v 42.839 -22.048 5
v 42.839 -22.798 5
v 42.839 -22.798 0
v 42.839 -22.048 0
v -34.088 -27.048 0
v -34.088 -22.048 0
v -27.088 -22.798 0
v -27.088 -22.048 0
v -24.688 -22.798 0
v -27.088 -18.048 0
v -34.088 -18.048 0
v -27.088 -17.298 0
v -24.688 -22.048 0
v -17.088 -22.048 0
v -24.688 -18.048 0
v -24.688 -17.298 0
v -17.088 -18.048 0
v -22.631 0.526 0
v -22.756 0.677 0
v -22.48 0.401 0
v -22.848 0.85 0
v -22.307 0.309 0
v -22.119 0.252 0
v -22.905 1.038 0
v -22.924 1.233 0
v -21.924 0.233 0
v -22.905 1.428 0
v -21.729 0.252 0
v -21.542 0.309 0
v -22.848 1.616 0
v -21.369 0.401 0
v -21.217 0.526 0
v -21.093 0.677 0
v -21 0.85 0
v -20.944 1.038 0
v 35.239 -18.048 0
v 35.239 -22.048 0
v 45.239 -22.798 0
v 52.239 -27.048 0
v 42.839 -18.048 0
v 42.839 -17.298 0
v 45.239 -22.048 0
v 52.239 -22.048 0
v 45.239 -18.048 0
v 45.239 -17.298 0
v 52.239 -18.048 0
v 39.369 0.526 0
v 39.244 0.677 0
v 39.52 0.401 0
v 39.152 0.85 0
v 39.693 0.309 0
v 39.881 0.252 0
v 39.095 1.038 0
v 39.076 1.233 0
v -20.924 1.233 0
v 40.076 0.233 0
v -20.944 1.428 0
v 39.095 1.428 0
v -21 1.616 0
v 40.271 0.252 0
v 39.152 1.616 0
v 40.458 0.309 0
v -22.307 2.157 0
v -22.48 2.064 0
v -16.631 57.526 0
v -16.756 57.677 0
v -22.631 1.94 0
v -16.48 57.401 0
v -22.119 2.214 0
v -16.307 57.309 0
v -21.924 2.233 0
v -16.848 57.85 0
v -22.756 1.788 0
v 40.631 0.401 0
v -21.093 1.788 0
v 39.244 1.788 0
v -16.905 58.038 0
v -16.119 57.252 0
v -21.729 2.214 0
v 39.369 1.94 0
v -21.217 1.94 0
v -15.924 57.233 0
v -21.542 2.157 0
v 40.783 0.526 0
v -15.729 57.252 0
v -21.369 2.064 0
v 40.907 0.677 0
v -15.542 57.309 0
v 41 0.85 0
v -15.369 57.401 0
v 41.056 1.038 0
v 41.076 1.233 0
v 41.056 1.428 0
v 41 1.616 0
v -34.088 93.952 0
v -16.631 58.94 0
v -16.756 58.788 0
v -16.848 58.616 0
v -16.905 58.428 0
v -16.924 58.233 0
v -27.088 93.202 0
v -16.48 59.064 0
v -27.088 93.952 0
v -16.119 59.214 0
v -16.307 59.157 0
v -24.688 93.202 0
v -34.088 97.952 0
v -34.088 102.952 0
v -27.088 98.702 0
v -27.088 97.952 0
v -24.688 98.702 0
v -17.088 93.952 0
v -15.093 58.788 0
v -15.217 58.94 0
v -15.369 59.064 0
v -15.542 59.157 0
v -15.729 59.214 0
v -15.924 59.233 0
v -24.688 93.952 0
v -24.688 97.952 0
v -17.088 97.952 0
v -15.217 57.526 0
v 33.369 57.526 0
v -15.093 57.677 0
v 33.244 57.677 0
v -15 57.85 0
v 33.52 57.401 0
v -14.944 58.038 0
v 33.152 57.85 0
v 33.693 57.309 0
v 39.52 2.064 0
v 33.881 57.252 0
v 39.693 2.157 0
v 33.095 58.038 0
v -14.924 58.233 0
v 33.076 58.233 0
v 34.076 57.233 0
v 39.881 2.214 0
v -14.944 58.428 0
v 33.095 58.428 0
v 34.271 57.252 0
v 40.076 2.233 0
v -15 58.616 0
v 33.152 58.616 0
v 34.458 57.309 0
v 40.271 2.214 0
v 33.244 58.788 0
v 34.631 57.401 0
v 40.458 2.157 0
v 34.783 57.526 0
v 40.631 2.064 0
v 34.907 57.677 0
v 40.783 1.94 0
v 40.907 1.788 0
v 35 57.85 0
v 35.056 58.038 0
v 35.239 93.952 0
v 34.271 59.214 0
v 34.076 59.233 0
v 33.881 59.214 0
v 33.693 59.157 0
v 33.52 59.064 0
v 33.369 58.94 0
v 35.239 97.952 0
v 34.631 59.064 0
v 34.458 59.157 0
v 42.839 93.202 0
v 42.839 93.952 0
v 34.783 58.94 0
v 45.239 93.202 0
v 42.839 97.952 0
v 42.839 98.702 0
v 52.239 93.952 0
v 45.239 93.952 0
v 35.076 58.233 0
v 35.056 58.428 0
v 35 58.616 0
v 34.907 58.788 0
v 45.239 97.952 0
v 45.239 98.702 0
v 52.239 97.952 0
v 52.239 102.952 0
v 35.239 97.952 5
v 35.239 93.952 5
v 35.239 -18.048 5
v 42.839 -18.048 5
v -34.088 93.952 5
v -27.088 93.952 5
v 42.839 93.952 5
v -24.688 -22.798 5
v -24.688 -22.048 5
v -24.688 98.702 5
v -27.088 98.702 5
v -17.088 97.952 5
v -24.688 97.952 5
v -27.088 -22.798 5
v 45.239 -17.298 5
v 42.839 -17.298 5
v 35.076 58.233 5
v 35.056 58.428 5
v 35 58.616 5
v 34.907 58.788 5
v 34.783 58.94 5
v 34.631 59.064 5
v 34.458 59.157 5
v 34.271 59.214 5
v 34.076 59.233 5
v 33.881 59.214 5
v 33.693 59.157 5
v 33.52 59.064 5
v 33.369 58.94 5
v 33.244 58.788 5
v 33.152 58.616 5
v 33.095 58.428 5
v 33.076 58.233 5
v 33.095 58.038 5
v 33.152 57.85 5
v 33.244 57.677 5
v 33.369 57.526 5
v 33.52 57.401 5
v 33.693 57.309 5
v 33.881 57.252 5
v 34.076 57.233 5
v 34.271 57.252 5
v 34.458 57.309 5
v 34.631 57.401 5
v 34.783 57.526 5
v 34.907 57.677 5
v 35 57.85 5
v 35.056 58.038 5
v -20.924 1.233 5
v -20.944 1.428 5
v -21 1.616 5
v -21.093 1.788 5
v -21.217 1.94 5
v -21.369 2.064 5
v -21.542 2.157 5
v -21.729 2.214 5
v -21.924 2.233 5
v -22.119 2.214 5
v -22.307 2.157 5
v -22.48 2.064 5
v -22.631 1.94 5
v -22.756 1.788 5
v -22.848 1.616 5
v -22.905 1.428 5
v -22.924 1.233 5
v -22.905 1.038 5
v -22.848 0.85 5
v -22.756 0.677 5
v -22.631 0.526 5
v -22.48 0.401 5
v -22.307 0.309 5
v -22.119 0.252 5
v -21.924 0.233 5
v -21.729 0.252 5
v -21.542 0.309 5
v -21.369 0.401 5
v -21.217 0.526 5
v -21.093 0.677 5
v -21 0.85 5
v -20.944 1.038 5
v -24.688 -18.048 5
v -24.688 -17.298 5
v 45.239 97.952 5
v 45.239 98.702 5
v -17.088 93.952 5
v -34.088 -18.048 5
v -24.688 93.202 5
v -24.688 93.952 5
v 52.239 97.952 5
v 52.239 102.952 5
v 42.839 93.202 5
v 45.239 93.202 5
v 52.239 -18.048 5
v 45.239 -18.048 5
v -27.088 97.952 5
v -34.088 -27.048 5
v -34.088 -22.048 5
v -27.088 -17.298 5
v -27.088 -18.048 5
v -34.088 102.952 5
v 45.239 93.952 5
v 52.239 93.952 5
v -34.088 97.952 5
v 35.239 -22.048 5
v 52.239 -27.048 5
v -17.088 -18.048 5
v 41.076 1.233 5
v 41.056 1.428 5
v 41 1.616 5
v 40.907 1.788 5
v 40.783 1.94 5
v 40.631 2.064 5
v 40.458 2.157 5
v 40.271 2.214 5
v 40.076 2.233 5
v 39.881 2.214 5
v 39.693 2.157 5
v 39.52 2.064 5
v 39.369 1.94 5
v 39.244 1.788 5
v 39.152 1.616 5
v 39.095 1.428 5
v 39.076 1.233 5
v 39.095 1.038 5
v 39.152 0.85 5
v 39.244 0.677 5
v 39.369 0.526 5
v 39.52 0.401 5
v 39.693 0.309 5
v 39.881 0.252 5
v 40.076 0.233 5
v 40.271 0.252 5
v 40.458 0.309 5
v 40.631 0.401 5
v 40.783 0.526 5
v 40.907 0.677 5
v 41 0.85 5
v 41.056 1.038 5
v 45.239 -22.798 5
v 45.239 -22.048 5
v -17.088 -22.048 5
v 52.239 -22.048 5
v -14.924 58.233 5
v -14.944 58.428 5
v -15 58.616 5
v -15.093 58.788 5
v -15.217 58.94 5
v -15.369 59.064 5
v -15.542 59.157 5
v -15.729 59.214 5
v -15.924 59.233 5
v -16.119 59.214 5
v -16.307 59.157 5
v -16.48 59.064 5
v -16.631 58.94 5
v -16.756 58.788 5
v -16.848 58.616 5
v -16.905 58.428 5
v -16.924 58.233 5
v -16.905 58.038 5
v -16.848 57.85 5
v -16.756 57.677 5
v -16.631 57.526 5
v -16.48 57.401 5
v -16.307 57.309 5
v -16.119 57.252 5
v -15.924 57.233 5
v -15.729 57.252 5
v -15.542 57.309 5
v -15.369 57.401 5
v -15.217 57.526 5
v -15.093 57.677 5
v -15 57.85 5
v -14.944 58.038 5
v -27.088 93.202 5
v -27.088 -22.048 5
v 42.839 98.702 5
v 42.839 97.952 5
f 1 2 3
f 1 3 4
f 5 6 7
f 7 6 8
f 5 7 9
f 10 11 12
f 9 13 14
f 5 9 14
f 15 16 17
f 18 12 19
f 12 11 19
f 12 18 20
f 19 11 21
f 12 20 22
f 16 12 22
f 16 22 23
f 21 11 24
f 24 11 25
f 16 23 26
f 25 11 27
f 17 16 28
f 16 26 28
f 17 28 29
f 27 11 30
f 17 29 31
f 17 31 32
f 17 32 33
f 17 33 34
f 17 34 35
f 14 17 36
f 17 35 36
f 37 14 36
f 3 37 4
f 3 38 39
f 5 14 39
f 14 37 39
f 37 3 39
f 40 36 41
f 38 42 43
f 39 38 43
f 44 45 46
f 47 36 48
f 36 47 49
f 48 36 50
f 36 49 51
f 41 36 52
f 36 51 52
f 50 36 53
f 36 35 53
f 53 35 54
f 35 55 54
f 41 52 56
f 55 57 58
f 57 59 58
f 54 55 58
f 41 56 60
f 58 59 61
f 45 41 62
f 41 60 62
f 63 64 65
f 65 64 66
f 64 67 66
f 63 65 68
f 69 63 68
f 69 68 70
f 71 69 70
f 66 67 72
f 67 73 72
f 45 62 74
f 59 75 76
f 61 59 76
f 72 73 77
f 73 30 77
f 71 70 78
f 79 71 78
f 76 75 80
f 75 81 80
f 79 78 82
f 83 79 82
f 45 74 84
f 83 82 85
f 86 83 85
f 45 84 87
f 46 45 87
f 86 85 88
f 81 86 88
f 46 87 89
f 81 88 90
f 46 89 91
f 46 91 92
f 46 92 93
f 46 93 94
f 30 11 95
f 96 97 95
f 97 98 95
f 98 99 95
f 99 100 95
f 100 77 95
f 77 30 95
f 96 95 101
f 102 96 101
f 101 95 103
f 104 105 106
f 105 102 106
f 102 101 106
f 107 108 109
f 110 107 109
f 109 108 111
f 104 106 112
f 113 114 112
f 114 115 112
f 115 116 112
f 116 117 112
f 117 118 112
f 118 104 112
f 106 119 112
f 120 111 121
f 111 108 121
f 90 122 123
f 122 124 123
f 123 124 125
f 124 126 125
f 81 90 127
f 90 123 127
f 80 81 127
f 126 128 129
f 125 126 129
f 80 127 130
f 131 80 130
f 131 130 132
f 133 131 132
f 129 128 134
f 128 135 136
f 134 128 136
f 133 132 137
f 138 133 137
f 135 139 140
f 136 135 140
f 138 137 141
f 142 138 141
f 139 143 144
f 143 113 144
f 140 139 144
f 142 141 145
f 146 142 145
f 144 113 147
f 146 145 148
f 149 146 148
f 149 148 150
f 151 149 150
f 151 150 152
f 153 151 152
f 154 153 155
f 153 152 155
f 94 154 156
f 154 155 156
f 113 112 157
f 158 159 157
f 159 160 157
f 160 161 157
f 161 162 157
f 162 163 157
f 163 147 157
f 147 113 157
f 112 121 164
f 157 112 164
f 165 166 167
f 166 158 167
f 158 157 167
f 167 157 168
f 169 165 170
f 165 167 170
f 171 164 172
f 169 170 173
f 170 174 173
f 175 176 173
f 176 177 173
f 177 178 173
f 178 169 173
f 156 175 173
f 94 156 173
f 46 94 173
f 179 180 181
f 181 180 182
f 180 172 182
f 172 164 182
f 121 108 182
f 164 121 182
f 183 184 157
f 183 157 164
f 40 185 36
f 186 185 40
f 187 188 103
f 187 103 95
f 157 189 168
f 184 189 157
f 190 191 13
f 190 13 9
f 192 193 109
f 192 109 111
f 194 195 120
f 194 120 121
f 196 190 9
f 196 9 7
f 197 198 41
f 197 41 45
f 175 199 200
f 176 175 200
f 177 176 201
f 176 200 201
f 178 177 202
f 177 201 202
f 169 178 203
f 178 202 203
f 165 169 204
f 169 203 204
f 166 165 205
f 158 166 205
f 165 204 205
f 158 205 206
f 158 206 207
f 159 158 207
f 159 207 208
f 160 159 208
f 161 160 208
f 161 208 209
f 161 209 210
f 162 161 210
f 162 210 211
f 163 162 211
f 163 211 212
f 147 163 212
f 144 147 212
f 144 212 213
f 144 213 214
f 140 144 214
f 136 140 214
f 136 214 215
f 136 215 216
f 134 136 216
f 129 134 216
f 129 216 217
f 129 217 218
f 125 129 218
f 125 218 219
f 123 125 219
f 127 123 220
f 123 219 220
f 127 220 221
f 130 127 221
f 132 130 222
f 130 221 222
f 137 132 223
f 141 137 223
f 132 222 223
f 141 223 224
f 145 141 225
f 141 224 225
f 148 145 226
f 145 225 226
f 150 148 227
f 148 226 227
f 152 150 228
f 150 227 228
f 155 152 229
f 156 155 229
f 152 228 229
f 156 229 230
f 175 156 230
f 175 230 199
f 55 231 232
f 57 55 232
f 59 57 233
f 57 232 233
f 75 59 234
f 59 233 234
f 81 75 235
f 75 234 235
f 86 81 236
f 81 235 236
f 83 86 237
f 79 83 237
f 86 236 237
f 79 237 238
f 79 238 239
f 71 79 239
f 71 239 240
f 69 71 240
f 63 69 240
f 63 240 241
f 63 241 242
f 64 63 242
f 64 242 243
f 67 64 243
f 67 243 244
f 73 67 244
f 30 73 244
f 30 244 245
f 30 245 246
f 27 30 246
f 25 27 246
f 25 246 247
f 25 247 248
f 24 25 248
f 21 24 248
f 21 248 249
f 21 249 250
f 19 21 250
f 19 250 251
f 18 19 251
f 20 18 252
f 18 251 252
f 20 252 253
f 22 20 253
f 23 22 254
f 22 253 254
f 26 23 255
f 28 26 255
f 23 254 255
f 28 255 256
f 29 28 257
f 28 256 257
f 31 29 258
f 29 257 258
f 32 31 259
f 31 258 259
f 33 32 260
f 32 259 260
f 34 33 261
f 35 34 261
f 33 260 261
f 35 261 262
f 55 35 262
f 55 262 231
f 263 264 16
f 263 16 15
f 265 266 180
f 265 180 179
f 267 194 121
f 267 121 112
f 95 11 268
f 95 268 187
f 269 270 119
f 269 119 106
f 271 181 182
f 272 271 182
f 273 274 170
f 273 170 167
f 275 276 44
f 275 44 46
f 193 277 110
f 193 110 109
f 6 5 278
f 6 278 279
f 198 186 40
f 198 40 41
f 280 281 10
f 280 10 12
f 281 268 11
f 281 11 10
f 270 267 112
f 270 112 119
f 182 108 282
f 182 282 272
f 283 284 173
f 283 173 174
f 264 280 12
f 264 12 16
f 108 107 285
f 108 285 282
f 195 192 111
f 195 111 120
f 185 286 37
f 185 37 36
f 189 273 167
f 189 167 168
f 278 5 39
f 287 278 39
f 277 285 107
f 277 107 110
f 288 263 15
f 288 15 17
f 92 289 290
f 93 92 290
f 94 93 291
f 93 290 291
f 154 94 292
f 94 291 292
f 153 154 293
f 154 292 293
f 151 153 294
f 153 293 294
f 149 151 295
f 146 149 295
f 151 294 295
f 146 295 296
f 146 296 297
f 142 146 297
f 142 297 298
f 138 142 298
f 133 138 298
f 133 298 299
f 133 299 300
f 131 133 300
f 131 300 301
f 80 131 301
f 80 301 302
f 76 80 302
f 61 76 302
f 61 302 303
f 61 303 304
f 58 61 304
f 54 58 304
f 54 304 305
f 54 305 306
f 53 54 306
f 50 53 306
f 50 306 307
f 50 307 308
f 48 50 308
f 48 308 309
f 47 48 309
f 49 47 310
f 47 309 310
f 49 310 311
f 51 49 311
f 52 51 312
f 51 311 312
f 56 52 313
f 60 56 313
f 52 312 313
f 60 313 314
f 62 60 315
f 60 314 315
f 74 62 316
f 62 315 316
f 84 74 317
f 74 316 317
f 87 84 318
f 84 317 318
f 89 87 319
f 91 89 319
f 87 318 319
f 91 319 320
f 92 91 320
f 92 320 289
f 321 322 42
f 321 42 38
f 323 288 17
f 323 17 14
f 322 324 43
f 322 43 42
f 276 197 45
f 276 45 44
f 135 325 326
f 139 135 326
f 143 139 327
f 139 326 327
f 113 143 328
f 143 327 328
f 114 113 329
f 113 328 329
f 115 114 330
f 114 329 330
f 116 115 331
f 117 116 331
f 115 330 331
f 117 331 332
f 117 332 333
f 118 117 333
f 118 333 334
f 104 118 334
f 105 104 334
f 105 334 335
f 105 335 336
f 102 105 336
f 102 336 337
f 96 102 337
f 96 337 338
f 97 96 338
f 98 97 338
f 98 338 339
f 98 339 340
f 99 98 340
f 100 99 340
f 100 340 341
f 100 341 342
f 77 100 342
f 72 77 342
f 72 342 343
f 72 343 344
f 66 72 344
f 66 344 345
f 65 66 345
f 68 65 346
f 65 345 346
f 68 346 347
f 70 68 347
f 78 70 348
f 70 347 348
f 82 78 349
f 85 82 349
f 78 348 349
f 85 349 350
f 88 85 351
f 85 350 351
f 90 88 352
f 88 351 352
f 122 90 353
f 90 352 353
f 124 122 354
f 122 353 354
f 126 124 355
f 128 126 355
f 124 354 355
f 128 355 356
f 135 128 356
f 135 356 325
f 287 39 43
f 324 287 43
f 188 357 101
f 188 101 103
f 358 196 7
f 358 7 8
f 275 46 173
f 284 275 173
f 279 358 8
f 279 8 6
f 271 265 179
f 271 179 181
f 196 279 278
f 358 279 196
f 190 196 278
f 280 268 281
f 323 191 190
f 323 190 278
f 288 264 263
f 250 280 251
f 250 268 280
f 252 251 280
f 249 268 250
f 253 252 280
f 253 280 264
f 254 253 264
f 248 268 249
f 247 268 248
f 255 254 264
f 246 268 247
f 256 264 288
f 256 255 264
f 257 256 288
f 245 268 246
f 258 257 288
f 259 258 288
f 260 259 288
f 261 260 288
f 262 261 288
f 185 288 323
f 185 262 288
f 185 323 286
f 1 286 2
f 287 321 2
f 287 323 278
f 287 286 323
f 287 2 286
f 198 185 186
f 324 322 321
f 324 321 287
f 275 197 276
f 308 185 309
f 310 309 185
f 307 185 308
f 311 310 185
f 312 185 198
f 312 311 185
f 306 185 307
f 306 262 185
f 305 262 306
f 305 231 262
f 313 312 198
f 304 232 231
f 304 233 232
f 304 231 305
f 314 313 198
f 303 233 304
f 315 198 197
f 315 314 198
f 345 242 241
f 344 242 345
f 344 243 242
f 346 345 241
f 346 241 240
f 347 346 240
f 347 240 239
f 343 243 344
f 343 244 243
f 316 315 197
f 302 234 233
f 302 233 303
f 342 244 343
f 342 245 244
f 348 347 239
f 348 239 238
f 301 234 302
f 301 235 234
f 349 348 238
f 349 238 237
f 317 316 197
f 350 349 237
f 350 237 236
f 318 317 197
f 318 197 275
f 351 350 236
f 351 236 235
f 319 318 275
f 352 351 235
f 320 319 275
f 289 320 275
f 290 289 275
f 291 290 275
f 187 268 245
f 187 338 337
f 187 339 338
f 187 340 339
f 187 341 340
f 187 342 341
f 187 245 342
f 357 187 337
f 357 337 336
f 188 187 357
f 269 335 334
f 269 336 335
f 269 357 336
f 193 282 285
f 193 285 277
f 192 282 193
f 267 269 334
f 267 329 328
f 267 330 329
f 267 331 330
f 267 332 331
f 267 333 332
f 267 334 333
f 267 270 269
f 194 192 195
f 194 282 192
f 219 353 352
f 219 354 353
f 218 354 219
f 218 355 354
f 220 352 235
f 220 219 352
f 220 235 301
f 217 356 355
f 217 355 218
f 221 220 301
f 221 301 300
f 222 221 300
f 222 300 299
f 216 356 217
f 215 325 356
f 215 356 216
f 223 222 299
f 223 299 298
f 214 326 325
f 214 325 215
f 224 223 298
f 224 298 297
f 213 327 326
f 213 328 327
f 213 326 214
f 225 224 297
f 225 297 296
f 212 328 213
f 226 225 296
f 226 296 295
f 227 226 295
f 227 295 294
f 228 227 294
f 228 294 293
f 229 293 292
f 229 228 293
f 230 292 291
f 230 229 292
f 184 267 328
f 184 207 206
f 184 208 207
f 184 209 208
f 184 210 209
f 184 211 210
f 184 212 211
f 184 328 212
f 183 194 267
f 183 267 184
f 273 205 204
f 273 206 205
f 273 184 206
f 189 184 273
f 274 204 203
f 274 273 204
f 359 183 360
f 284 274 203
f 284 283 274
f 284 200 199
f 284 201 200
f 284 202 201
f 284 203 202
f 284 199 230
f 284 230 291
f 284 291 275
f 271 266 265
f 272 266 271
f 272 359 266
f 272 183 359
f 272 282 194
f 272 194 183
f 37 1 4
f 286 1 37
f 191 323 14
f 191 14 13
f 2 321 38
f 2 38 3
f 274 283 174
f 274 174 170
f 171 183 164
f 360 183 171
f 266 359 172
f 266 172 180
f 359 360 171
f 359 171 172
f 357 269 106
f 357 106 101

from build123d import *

# Parameters (mm, degrees)
SKETCH1_W           = 86.32648043
SKETCH1_H           = 130
BOSS_EXTRUDE1_DEPTH = 5
CUT_EXTRUDE2_DEPTH  = 10
SKETCH4_R           = 1
CUT_EXTRUDE3_DEPTH  = 10


with BuildPart() as part:
    # Sketch1 → Boss-Extrude1 (new body)
    with BuildSketch(Plane.XY):
        with Locations((9.075669342, 37.952105326)):
            Rectangle(SKETCH1_W, SKETCH1_H)
    extrude(amount=BOSS_EXTRUDE1_DEPTH)

    # Sketch3 → Cut-Extrude2 (cut)
    with BuildSketch(Plane.XY.offset(5)):
        Polygon((-34.087570873, -18.047894674), (-27.087570873, -18.047894674), (-27.087570873, -17.297894674), (-24.687570873, -17.297894674), (-24.687570873, -18.047894674), (-17.087570873, -18.047894674), (-17.087570873, -22.047894674), (-24.687570873, -22.047894674), (-24.687570873, -22.797894674), (-27.087570873, -22.797894674), (-27.087570873, -22.047894674), (-34.087570873, -22.047894674), align=None)
        Polygon((52.238909557, -18.047894674), (52.238909557, -22.047894674), (45.238909557, -22.047894674), (45.238909557, -22.797894674), (42.838909557, -22.797894674), (42.838909557, -22.047894674), (35.238909557, -22.047894674), (35.238909557, -18.047894674), (42.838909557, -18.047894674), (42.838909557, -17.297894674), (45.238909557, -17.297894674), (45.238909557, -18.047894674), align=None)
        Polygon((52.238909557, 93.952105326), (45.238909557, 93.952105326), (45.238909557, 93.202105326), (42.838909557, 93.202105326), (42.838909557, 93.952105326), (35.238909557, 93.952105326), (35.238909557, 97.952105326), (42.838909557, 97.952105326), (42.838909557, 98.702105326), (45.238909557, 98.702105326), (45.238909557, 97.952105326), (52.238909557, 97.952105326), align=None)
        Polygon((-34.087570873, 93.952105326), (-34.087570873, 97.952105326), (-27.087570873, 97.952105326), (-27.087570873, 98.702105326), (-24.687570873, 98.702105326), (-24.687570873, 97.952105326), (-17.087570873, 97.952105326), (-17.087570873, 93.952105326), (-24.687570873, 93.952105326), (-24.687570873, 93.202105326), (-27.087570873, 93.202105326), (-27.087570873, 93.952105326), align=None)
    extrude(amount=-CUT_EXTRUDE2_DEPTH, mode=Mode.SUBTRACT)

    # Sketch4 → Cut-Extrude3 (cut)
    with BuildSketch(Plane.XY.offset(5)):
        with Locations((40.075669342, 1.232918464)):
            Circle(SKETCH4_R)
        with Locations((-21.924330658, 1.232918464)):
            Circle(SKETCH4_R)
        with Locations((-15.924330658, 58.232918464)):
            Circle(SKETCH4_R)
        with Locations((34.075669342, 58.232918464)):
            Circle(SKETCH4_R)
    extrude(amount=-CUT_EXTRUDE3_DEPTH, mode=Mode.SUBTRACT)


solid = part.part
